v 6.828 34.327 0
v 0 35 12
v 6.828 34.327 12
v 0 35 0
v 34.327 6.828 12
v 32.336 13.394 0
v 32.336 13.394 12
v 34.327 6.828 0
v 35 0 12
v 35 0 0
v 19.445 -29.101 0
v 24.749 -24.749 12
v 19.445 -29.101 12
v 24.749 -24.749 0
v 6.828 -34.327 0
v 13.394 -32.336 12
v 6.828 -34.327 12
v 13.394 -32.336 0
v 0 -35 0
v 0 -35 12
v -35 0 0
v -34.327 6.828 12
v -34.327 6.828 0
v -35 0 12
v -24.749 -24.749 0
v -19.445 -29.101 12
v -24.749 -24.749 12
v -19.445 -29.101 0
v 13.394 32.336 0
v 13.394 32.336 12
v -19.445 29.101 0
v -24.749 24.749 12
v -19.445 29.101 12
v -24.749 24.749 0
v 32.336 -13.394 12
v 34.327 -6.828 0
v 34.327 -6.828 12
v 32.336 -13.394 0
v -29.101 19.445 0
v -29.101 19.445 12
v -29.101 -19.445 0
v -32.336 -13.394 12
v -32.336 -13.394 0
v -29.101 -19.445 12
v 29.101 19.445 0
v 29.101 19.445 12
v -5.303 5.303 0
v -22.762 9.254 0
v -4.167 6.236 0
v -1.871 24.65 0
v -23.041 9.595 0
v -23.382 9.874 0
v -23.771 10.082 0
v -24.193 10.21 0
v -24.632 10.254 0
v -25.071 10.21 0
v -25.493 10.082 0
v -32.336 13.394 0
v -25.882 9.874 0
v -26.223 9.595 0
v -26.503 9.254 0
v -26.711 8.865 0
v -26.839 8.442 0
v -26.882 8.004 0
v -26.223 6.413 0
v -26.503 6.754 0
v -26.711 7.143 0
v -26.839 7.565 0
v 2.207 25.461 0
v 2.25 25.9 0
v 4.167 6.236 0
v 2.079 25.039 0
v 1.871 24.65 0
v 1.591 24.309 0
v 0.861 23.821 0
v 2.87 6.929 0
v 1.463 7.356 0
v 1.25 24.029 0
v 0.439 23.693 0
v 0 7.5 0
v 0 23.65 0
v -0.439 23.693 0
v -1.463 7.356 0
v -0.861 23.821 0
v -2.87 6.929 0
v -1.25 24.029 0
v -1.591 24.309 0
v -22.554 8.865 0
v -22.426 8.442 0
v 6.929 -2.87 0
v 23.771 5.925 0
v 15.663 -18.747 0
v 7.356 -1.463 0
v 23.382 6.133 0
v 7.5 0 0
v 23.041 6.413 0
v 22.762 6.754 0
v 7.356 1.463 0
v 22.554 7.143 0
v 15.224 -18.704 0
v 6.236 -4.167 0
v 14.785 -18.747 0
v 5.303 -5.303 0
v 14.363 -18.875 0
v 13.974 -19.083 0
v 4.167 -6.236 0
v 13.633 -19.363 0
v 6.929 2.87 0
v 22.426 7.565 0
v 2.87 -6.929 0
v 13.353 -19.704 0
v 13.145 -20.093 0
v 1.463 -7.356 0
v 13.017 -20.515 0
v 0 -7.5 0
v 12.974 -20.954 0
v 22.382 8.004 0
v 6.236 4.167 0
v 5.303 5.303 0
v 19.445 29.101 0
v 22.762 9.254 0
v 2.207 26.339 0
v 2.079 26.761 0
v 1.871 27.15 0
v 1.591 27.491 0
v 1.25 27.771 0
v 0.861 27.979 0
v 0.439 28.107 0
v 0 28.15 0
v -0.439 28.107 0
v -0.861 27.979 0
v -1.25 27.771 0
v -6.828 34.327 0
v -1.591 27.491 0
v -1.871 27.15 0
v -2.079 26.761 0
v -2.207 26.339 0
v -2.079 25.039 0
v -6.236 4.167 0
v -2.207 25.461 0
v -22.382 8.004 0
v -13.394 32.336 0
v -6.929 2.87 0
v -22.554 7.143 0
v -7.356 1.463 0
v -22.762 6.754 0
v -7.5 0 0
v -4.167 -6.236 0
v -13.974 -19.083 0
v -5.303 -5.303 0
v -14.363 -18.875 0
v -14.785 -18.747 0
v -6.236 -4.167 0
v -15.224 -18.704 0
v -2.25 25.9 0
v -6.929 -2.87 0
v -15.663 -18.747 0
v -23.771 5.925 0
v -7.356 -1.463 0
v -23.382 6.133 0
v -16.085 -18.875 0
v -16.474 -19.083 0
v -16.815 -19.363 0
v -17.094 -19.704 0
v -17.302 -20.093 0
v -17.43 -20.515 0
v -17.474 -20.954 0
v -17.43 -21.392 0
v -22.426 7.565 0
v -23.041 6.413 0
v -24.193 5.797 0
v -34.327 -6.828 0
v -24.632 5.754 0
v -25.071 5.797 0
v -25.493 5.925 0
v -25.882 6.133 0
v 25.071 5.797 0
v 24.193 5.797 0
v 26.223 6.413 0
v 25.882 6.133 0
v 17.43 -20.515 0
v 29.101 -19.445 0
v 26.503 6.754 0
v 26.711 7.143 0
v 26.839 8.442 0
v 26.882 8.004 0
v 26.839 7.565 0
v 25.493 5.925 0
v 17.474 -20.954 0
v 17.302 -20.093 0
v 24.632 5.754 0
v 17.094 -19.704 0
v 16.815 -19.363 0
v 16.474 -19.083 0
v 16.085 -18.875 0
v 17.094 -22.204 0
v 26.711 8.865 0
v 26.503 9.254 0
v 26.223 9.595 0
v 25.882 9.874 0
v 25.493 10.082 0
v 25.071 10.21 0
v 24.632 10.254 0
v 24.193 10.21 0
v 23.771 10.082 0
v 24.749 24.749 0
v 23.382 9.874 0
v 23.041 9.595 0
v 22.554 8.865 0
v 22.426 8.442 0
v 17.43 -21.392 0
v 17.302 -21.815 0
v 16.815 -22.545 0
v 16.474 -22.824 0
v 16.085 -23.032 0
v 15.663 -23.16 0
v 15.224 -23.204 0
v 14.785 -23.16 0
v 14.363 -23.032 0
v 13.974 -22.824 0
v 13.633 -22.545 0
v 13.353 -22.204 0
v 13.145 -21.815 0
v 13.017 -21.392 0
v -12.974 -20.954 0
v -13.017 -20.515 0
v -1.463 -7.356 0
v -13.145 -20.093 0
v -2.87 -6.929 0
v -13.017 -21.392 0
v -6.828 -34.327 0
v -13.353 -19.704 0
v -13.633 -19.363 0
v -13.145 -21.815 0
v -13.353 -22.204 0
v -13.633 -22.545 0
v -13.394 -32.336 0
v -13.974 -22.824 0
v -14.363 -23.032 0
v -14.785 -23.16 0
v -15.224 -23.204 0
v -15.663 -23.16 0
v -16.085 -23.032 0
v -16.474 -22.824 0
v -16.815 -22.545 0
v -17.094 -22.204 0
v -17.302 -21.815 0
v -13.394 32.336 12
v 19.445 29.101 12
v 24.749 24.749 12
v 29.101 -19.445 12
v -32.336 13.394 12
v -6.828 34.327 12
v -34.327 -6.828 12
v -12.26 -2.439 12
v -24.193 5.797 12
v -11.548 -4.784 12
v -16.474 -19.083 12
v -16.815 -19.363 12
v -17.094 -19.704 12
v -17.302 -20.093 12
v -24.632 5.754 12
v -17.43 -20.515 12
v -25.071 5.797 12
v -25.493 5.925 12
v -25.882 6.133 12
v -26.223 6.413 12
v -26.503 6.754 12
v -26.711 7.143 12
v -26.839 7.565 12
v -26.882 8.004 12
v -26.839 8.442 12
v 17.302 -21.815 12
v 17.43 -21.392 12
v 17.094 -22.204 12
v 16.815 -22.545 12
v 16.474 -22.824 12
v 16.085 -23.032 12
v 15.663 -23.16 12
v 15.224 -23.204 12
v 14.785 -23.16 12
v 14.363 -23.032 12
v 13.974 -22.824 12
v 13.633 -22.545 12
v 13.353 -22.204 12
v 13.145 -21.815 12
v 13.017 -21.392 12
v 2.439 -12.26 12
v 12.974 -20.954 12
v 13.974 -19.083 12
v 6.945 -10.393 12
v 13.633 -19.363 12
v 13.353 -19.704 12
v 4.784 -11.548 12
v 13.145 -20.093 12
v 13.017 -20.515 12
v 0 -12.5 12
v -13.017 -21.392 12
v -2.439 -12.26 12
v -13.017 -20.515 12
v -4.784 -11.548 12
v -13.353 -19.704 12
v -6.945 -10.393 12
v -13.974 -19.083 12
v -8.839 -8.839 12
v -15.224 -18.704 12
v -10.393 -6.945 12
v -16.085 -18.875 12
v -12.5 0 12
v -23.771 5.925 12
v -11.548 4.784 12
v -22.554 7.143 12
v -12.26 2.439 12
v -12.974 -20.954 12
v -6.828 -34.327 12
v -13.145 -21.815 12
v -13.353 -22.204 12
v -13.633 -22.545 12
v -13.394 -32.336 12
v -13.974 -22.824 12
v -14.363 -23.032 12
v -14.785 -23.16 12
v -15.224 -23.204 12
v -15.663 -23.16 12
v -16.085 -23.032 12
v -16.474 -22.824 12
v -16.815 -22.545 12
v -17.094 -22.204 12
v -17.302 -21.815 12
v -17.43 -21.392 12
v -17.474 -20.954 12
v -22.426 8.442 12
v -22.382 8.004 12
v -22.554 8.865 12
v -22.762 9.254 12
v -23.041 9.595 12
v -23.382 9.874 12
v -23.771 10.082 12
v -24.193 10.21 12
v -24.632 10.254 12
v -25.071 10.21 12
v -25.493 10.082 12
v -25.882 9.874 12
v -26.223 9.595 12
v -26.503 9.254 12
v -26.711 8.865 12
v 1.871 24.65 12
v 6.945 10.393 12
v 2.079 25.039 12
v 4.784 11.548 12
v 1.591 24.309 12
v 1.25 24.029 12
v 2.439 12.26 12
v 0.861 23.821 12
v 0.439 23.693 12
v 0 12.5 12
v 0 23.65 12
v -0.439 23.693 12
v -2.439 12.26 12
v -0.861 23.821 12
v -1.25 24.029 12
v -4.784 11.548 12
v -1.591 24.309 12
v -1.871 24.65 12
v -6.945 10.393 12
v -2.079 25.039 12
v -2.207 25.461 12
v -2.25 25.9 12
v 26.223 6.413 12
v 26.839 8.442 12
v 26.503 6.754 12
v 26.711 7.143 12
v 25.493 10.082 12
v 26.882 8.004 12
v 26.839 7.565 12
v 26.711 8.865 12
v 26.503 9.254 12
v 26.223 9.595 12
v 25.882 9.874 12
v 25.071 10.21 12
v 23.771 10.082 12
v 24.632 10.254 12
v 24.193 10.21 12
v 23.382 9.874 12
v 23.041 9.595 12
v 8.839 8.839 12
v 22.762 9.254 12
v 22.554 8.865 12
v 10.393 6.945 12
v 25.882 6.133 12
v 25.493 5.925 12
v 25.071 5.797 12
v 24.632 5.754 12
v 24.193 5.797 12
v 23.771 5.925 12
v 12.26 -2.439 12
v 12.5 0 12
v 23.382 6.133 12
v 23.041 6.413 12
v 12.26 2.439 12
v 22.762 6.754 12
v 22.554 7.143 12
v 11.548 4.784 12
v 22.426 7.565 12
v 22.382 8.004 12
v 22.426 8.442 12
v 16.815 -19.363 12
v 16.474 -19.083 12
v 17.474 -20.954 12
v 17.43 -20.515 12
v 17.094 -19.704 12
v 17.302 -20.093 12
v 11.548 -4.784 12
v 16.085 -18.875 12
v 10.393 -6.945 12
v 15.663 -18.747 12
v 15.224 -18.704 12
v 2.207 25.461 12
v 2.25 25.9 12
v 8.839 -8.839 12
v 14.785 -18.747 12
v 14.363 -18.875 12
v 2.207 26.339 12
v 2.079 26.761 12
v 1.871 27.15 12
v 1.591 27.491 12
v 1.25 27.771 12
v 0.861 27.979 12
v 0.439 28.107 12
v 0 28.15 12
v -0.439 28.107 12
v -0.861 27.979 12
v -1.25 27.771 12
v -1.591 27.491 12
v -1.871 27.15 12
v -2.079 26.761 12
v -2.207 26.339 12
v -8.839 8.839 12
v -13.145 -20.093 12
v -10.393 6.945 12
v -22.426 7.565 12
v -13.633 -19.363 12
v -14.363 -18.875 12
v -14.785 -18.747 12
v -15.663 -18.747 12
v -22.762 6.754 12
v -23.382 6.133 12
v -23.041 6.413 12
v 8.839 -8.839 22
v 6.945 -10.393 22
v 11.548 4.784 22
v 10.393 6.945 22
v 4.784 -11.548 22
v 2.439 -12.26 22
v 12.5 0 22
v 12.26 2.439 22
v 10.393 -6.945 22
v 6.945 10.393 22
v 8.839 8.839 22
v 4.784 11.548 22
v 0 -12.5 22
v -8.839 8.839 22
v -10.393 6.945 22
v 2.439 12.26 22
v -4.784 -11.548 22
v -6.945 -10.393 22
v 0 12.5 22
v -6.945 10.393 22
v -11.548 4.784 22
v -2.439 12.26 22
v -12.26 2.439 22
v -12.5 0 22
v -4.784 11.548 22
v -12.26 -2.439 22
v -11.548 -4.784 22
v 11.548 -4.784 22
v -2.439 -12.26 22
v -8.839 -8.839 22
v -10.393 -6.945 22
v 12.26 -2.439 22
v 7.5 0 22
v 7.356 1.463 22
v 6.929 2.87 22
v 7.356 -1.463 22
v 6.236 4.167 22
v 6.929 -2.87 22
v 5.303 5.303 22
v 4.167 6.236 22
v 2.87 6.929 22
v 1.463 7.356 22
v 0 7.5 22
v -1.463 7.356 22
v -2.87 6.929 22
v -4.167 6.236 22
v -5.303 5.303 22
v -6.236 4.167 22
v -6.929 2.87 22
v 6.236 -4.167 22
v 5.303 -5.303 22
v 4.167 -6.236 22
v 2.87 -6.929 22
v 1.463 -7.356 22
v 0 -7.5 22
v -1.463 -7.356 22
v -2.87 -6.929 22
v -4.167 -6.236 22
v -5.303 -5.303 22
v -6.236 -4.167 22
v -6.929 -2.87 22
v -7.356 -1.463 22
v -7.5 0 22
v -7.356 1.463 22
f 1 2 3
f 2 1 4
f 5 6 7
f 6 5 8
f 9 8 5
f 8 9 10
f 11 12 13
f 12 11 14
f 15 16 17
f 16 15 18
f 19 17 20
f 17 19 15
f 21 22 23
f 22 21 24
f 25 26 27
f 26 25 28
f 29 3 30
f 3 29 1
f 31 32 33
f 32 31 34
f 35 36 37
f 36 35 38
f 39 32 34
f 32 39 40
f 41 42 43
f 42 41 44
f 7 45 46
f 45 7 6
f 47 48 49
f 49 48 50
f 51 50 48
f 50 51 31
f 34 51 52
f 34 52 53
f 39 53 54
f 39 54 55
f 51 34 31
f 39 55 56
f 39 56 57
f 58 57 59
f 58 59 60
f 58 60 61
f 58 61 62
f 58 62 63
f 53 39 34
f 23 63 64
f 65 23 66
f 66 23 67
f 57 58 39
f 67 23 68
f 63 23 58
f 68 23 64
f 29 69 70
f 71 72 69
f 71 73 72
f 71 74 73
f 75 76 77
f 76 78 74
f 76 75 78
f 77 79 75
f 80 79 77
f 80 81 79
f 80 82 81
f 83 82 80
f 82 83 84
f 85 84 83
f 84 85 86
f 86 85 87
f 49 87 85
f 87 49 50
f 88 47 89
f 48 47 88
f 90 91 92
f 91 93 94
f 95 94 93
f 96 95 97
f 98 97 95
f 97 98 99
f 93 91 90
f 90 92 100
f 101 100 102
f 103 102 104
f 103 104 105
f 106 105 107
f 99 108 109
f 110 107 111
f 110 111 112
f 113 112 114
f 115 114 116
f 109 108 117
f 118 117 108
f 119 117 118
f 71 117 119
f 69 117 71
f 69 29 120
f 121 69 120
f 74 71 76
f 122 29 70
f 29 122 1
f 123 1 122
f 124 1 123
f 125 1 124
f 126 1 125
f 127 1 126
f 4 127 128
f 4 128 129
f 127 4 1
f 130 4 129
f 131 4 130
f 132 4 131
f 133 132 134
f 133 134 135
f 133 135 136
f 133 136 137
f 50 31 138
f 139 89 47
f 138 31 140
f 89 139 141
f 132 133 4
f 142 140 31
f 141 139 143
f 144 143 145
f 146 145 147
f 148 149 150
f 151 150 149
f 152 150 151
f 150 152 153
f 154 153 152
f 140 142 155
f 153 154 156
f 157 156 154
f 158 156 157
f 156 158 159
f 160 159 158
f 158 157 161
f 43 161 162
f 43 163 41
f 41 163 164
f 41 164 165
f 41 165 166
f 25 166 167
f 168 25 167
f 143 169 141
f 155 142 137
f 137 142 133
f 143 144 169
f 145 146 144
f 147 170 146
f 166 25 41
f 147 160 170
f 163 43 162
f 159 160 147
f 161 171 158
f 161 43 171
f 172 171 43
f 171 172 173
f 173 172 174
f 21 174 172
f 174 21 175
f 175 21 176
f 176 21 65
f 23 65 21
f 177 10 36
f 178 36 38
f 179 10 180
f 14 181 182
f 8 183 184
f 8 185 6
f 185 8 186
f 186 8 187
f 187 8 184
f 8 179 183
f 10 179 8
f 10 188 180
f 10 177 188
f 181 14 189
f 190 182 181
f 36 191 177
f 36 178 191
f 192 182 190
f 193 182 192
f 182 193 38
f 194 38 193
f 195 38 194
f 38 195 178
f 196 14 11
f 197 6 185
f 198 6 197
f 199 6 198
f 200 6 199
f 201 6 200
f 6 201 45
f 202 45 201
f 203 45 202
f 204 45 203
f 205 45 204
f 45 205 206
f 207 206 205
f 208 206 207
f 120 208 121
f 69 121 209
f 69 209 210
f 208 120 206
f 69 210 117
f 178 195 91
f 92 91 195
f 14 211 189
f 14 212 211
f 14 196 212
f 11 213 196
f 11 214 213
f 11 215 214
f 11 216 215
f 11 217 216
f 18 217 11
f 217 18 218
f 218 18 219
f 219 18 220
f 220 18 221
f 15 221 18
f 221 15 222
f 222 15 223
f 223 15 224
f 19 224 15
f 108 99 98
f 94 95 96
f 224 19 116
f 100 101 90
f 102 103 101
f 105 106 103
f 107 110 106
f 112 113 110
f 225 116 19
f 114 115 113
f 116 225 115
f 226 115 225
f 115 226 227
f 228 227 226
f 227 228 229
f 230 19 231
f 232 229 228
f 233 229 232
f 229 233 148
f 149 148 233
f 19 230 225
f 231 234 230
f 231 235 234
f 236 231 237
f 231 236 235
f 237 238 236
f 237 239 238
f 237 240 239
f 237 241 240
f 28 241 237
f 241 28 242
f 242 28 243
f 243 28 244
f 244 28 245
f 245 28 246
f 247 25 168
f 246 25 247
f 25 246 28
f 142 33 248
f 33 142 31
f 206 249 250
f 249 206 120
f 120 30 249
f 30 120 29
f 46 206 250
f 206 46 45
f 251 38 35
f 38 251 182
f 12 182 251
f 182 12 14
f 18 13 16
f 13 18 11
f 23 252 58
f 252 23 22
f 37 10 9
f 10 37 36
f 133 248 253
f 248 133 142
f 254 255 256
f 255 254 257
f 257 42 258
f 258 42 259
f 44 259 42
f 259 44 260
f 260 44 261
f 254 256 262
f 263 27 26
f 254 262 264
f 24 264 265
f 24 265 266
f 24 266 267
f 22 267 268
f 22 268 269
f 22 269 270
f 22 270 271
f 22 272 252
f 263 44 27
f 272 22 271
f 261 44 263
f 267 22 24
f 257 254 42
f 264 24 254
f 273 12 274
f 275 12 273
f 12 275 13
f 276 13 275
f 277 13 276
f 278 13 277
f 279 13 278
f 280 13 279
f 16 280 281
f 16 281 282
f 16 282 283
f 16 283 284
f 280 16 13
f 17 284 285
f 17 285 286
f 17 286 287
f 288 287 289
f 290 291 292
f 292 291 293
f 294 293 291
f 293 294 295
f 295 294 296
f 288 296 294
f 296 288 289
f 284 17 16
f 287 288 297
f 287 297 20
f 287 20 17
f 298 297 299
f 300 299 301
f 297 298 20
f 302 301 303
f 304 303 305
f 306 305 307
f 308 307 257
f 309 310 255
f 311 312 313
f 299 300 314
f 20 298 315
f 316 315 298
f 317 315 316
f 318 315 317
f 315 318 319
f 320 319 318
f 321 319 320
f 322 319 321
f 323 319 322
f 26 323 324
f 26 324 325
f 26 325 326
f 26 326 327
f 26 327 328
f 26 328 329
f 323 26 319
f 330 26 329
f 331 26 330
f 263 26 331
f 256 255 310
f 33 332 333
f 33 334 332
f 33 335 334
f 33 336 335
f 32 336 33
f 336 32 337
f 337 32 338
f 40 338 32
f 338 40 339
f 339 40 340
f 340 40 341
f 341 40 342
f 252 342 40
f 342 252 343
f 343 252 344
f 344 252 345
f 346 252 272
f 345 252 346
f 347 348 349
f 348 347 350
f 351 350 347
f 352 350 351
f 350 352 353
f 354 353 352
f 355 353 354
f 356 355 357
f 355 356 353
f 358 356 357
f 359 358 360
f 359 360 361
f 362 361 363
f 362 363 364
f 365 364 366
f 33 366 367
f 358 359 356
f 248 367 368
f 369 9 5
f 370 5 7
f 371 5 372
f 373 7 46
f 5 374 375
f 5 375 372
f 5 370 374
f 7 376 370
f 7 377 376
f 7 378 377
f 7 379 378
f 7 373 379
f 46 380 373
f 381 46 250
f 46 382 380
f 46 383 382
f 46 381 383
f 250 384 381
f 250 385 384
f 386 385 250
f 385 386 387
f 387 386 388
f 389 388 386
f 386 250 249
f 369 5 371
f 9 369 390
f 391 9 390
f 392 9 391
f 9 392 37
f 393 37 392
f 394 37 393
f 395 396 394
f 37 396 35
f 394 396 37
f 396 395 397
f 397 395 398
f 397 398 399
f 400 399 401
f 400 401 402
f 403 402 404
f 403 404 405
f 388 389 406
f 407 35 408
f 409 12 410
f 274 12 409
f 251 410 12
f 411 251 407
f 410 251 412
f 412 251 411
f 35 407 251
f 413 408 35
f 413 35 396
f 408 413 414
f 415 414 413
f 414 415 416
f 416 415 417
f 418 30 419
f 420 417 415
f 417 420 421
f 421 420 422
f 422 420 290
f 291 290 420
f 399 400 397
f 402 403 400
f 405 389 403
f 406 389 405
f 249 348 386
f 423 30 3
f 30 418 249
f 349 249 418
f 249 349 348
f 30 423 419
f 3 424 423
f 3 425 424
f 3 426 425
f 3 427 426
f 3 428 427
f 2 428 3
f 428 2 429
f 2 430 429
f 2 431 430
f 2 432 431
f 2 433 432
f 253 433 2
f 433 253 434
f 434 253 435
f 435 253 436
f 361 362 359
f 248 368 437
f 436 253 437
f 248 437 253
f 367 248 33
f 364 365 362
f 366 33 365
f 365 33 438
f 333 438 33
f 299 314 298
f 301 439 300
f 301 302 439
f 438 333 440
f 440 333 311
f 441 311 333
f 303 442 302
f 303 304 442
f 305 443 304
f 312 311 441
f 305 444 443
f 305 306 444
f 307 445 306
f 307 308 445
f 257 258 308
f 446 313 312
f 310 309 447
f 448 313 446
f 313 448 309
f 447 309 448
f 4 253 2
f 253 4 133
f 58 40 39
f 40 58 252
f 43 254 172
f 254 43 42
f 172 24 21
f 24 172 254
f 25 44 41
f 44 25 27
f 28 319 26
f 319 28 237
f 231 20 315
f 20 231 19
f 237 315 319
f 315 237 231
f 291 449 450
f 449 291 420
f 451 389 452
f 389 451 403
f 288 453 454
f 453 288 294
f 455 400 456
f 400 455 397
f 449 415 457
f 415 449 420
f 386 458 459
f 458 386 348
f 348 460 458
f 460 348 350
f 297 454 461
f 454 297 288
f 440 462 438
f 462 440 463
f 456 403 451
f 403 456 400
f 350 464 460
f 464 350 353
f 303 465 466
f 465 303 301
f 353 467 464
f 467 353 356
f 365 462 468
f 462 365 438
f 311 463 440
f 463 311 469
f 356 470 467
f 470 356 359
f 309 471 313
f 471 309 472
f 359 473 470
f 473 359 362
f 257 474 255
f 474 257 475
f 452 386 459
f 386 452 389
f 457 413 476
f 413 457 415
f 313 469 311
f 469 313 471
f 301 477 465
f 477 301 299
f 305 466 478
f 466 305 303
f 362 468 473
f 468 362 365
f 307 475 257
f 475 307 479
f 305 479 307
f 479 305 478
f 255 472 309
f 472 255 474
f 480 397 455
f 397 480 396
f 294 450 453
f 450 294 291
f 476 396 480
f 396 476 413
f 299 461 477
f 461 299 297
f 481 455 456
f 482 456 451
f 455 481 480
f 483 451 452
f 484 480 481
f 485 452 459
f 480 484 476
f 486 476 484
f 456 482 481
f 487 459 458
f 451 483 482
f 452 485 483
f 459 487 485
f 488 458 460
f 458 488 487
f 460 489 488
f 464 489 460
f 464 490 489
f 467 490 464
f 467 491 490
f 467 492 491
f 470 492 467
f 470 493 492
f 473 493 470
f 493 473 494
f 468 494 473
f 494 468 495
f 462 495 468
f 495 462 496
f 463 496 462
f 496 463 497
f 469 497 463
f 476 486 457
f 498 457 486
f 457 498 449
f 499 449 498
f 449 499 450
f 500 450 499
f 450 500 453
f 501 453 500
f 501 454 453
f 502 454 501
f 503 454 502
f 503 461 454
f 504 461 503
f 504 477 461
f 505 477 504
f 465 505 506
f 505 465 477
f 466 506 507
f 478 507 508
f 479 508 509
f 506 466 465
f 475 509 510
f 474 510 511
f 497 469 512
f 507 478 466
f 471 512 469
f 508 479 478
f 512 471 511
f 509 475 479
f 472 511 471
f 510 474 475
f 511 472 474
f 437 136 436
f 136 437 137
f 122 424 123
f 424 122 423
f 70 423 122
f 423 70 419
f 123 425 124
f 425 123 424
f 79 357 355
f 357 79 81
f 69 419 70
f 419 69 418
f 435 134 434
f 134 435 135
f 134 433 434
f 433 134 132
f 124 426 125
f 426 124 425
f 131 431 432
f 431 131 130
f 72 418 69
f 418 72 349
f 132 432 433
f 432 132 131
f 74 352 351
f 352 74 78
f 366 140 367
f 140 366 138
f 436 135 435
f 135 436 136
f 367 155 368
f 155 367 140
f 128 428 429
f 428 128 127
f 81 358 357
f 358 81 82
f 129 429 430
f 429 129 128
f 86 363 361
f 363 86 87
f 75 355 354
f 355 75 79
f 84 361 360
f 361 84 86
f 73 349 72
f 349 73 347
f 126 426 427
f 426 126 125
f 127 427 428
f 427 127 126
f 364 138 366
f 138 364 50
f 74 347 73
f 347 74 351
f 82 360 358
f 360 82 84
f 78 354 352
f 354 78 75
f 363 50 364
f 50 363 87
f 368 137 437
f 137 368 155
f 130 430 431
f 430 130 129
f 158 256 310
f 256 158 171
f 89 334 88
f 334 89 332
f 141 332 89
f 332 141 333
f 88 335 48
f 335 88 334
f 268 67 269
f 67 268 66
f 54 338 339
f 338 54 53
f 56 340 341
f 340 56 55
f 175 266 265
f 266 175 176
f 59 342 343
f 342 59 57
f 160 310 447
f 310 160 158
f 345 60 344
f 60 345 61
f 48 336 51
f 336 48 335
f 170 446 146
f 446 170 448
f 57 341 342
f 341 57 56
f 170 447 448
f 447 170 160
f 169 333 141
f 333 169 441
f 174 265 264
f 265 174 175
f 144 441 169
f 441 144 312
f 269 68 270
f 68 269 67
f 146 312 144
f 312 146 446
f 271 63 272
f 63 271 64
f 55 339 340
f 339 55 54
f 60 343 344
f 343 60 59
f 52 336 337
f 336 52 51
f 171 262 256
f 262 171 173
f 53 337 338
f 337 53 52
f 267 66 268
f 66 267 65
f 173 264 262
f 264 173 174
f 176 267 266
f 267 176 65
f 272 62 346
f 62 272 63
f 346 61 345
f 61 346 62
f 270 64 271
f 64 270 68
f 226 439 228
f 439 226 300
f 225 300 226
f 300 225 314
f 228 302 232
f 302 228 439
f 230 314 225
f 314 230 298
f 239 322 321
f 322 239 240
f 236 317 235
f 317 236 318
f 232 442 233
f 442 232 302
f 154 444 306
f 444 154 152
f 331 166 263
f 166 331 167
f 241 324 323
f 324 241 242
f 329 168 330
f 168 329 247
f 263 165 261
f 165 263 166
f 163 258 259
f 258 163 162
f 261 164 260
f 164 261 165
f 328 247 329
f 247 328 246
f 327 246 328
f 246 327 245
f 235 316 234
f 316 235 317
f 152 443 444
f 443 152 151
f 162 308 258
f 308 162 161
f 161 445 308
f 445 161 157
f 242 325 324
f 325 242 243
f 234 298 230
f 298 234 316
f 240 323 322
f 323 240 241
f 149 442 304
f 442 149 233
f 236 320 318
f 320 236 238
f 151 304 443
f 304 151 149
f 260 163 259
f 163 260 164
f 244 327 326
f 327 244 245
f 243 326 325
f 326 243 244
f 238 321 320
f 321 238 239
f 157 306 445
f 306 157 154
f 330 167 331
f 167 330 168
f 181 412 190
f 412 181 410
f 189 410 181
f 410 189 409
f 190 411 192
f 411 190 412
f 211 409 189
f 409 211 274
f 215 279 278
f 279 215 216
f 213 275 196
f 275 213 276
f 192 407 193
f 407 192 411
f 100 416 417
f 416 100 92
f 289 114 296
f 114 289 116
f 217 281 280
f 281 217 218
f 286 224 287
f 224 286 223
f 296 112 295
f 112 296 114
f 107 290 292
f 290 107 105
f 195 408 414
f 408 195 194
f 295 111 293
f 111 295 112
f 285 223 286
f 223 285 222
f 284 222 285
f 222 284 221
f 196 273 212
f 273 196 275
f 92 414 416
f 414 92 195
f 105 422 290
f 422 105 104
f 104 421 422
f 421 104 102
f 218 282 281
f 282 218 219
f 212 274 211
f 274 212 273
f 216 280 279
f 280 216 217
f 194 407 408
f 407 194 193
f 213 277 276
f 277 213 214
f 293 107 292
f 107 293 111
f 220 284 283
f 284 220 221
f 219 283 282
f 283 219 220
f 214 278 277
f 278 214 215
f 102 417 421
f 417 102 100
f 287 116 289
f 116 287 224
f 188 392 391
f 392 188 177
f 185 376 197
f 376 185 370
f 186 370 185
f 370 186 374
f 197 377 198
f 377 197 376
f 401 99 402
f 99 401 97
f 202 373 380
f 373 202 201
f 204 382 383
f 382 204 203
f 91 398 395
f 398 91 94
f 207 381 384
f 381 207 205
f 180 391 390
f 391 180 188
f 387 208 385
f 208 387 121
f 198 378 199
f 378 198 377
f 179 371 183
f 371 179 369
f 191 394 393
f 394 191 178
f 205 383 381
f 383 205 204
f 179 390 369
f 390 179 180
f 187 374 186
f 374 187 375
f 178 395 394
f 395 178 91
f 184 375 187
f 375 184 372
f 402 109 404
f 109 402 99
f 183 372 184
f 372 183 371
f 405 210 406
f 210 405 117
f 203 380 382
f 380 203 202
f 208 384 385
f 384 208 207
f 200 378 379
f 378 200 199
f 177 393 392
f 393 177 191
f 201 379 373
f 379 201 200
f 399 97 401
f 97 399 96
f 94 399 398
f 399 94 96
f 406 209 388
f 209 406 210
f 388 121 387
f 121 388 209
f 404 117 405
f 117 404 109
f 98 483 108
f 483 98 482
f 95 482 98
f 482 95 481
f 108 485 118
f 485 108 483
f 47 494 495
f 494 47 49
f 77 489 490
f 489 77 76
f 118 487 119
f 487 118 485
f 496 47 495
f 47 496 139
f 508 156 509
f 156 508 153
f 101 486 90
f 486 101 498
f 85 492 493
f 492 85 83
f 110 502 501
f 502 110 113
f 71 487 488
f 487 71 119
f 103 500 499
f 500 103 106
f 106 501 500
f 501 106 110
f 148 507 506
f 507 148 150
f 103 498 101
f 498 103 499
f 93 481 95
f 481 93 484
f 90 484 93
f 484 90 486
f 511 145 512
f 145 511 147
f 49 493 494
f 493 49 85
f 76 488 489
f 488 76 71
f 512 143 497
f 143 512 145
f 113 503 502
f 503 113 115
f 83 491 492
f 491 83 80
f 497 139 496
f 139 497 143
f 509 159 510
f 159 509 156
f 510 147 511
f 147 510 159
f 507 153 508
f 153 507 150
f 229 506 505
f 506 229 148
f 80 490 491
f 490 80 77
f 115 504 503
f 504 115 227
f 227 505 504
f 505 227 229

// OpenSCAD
$fn = 32;

// ----------------------------------------------------------------------
// Flange Ø70 x 12
// 5 holes on a Ø51.8 bolt circle, bolted joints
// ----------------------------------------------------------------------

// --- parameters (mm) ---
flange_d = 70;   // outside diameter of the flange
thickness = 12;  // flange thickness
holes = 5;       // number of bolt holes
pcd = 51.8;      // bolt circle diameter
start_deg = 90;  // angle of the first hole, from +X
hole_d = 4.5;    // bolt hole diameter
bore_d = 15;     // central through bore
hub_d = 25;      // hub outside diameter
hub_h = 10;      // hub height above the flange face (0 = no hub)

// --- derived feature positions (mm) ---
height = thickness + hub_h;  // = 22   overall height of the part
pcd_r = pcd / 2;             // = 25.9   bolt circle radius
hole_step = 360 / holes;     // = 72   angular pitch
feature_centers = [
  [pcd_r * cos(start_deg + 0 * hole_step), pcd_r * sin(start_deg + 0 * hole_step)],
  [pcd_r * cos(start_deg + 1 * hole_step), pcd_r * sin(start_deg + 1 * hole_step)],
  [pcd_r * cos(start_deg + 2 * hole_step), pcd_r * sin(start_deg + 2 * hole_step)],
  [pcd_r * cos(start_deg + 3 * hole_step), pcd_r * sin(start_deg + 3 * hole_step)],
  [pcd_r * cos(start_deg + 4 * hole_step), pcd_r * sin(start_deg + 4 * hole_step)]
];   // bolt hole centres on the pitch circle

// flange disc, every hole and the bore cut straight through
difference() {
  union() {
    cylinder(d = flange_d, h = thickness);
    cylinder(d = hub_d, h = height);  // hub, overlapped into the flange
  }
  translate([0, 0, -1]) cylinder(d = bore_d, h = height + 2);  // bore, through
  for (centre = feature_centers)
    translate([centre[0], centre[1], -1]) cylinder(d = hole_d, h = thickness + 2);
}
